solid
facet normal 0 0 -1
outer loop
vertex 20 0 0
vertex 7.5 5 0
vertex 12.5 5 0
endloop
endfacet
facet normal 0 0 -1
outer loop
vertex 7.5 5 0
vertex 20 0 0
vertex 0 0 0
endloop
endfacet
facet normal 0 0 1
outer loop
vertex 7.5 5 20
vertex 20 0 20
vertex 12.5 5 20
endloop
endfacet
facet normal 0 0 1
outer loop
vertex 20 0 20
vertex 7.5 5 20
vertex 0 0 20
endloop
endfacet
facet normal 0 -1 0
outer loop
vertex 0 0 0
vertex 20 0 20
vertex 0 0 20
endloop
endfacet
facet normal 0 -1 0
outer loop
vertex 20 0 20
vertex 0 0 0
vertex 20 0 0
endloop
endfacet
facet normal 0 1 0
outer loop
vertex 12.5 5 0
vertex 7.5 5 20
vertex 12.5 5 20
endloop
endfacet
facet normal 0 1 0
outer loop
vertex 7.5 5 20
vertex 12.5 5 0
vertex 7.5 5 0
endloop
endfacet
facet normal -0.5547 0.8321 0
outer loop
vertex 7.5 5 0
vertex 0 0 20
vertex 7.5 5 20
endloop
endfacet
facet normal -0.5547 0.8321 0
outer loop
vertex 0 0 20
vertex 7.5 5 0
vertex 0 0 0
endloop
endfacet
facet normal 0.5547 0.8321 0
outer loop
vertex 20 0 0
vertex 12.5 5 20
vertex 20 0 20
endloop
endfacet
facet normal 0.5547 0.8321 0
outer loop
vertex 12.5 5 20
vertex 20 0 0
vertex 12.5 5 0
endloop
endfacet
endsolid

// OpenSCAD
module trap(base,top,height, depth)
{

    polyhedron(
        points=[
            //front
            [0,0,0],
            [base,0,0],
            [(base/2)+(top/2),height,0],
            [(base/2)-(top/2),height,0],

            //rear
            [0,0,depth],
            [base,0,depth],
            [(base/2)+(top/2),height,depth],
            [(base/2)-(top/2),height,depth],
        ],

        faces=[
            [0,1,2,3], //front
            [7,6,5,4], //rear
            [0,4,5,1], //bottom
            [2,6,7,3], //top
            [0,3,7,4], //left
            [5,6,2,1], //right
            
        ]

    );
}

trap(20,5,5,20);
